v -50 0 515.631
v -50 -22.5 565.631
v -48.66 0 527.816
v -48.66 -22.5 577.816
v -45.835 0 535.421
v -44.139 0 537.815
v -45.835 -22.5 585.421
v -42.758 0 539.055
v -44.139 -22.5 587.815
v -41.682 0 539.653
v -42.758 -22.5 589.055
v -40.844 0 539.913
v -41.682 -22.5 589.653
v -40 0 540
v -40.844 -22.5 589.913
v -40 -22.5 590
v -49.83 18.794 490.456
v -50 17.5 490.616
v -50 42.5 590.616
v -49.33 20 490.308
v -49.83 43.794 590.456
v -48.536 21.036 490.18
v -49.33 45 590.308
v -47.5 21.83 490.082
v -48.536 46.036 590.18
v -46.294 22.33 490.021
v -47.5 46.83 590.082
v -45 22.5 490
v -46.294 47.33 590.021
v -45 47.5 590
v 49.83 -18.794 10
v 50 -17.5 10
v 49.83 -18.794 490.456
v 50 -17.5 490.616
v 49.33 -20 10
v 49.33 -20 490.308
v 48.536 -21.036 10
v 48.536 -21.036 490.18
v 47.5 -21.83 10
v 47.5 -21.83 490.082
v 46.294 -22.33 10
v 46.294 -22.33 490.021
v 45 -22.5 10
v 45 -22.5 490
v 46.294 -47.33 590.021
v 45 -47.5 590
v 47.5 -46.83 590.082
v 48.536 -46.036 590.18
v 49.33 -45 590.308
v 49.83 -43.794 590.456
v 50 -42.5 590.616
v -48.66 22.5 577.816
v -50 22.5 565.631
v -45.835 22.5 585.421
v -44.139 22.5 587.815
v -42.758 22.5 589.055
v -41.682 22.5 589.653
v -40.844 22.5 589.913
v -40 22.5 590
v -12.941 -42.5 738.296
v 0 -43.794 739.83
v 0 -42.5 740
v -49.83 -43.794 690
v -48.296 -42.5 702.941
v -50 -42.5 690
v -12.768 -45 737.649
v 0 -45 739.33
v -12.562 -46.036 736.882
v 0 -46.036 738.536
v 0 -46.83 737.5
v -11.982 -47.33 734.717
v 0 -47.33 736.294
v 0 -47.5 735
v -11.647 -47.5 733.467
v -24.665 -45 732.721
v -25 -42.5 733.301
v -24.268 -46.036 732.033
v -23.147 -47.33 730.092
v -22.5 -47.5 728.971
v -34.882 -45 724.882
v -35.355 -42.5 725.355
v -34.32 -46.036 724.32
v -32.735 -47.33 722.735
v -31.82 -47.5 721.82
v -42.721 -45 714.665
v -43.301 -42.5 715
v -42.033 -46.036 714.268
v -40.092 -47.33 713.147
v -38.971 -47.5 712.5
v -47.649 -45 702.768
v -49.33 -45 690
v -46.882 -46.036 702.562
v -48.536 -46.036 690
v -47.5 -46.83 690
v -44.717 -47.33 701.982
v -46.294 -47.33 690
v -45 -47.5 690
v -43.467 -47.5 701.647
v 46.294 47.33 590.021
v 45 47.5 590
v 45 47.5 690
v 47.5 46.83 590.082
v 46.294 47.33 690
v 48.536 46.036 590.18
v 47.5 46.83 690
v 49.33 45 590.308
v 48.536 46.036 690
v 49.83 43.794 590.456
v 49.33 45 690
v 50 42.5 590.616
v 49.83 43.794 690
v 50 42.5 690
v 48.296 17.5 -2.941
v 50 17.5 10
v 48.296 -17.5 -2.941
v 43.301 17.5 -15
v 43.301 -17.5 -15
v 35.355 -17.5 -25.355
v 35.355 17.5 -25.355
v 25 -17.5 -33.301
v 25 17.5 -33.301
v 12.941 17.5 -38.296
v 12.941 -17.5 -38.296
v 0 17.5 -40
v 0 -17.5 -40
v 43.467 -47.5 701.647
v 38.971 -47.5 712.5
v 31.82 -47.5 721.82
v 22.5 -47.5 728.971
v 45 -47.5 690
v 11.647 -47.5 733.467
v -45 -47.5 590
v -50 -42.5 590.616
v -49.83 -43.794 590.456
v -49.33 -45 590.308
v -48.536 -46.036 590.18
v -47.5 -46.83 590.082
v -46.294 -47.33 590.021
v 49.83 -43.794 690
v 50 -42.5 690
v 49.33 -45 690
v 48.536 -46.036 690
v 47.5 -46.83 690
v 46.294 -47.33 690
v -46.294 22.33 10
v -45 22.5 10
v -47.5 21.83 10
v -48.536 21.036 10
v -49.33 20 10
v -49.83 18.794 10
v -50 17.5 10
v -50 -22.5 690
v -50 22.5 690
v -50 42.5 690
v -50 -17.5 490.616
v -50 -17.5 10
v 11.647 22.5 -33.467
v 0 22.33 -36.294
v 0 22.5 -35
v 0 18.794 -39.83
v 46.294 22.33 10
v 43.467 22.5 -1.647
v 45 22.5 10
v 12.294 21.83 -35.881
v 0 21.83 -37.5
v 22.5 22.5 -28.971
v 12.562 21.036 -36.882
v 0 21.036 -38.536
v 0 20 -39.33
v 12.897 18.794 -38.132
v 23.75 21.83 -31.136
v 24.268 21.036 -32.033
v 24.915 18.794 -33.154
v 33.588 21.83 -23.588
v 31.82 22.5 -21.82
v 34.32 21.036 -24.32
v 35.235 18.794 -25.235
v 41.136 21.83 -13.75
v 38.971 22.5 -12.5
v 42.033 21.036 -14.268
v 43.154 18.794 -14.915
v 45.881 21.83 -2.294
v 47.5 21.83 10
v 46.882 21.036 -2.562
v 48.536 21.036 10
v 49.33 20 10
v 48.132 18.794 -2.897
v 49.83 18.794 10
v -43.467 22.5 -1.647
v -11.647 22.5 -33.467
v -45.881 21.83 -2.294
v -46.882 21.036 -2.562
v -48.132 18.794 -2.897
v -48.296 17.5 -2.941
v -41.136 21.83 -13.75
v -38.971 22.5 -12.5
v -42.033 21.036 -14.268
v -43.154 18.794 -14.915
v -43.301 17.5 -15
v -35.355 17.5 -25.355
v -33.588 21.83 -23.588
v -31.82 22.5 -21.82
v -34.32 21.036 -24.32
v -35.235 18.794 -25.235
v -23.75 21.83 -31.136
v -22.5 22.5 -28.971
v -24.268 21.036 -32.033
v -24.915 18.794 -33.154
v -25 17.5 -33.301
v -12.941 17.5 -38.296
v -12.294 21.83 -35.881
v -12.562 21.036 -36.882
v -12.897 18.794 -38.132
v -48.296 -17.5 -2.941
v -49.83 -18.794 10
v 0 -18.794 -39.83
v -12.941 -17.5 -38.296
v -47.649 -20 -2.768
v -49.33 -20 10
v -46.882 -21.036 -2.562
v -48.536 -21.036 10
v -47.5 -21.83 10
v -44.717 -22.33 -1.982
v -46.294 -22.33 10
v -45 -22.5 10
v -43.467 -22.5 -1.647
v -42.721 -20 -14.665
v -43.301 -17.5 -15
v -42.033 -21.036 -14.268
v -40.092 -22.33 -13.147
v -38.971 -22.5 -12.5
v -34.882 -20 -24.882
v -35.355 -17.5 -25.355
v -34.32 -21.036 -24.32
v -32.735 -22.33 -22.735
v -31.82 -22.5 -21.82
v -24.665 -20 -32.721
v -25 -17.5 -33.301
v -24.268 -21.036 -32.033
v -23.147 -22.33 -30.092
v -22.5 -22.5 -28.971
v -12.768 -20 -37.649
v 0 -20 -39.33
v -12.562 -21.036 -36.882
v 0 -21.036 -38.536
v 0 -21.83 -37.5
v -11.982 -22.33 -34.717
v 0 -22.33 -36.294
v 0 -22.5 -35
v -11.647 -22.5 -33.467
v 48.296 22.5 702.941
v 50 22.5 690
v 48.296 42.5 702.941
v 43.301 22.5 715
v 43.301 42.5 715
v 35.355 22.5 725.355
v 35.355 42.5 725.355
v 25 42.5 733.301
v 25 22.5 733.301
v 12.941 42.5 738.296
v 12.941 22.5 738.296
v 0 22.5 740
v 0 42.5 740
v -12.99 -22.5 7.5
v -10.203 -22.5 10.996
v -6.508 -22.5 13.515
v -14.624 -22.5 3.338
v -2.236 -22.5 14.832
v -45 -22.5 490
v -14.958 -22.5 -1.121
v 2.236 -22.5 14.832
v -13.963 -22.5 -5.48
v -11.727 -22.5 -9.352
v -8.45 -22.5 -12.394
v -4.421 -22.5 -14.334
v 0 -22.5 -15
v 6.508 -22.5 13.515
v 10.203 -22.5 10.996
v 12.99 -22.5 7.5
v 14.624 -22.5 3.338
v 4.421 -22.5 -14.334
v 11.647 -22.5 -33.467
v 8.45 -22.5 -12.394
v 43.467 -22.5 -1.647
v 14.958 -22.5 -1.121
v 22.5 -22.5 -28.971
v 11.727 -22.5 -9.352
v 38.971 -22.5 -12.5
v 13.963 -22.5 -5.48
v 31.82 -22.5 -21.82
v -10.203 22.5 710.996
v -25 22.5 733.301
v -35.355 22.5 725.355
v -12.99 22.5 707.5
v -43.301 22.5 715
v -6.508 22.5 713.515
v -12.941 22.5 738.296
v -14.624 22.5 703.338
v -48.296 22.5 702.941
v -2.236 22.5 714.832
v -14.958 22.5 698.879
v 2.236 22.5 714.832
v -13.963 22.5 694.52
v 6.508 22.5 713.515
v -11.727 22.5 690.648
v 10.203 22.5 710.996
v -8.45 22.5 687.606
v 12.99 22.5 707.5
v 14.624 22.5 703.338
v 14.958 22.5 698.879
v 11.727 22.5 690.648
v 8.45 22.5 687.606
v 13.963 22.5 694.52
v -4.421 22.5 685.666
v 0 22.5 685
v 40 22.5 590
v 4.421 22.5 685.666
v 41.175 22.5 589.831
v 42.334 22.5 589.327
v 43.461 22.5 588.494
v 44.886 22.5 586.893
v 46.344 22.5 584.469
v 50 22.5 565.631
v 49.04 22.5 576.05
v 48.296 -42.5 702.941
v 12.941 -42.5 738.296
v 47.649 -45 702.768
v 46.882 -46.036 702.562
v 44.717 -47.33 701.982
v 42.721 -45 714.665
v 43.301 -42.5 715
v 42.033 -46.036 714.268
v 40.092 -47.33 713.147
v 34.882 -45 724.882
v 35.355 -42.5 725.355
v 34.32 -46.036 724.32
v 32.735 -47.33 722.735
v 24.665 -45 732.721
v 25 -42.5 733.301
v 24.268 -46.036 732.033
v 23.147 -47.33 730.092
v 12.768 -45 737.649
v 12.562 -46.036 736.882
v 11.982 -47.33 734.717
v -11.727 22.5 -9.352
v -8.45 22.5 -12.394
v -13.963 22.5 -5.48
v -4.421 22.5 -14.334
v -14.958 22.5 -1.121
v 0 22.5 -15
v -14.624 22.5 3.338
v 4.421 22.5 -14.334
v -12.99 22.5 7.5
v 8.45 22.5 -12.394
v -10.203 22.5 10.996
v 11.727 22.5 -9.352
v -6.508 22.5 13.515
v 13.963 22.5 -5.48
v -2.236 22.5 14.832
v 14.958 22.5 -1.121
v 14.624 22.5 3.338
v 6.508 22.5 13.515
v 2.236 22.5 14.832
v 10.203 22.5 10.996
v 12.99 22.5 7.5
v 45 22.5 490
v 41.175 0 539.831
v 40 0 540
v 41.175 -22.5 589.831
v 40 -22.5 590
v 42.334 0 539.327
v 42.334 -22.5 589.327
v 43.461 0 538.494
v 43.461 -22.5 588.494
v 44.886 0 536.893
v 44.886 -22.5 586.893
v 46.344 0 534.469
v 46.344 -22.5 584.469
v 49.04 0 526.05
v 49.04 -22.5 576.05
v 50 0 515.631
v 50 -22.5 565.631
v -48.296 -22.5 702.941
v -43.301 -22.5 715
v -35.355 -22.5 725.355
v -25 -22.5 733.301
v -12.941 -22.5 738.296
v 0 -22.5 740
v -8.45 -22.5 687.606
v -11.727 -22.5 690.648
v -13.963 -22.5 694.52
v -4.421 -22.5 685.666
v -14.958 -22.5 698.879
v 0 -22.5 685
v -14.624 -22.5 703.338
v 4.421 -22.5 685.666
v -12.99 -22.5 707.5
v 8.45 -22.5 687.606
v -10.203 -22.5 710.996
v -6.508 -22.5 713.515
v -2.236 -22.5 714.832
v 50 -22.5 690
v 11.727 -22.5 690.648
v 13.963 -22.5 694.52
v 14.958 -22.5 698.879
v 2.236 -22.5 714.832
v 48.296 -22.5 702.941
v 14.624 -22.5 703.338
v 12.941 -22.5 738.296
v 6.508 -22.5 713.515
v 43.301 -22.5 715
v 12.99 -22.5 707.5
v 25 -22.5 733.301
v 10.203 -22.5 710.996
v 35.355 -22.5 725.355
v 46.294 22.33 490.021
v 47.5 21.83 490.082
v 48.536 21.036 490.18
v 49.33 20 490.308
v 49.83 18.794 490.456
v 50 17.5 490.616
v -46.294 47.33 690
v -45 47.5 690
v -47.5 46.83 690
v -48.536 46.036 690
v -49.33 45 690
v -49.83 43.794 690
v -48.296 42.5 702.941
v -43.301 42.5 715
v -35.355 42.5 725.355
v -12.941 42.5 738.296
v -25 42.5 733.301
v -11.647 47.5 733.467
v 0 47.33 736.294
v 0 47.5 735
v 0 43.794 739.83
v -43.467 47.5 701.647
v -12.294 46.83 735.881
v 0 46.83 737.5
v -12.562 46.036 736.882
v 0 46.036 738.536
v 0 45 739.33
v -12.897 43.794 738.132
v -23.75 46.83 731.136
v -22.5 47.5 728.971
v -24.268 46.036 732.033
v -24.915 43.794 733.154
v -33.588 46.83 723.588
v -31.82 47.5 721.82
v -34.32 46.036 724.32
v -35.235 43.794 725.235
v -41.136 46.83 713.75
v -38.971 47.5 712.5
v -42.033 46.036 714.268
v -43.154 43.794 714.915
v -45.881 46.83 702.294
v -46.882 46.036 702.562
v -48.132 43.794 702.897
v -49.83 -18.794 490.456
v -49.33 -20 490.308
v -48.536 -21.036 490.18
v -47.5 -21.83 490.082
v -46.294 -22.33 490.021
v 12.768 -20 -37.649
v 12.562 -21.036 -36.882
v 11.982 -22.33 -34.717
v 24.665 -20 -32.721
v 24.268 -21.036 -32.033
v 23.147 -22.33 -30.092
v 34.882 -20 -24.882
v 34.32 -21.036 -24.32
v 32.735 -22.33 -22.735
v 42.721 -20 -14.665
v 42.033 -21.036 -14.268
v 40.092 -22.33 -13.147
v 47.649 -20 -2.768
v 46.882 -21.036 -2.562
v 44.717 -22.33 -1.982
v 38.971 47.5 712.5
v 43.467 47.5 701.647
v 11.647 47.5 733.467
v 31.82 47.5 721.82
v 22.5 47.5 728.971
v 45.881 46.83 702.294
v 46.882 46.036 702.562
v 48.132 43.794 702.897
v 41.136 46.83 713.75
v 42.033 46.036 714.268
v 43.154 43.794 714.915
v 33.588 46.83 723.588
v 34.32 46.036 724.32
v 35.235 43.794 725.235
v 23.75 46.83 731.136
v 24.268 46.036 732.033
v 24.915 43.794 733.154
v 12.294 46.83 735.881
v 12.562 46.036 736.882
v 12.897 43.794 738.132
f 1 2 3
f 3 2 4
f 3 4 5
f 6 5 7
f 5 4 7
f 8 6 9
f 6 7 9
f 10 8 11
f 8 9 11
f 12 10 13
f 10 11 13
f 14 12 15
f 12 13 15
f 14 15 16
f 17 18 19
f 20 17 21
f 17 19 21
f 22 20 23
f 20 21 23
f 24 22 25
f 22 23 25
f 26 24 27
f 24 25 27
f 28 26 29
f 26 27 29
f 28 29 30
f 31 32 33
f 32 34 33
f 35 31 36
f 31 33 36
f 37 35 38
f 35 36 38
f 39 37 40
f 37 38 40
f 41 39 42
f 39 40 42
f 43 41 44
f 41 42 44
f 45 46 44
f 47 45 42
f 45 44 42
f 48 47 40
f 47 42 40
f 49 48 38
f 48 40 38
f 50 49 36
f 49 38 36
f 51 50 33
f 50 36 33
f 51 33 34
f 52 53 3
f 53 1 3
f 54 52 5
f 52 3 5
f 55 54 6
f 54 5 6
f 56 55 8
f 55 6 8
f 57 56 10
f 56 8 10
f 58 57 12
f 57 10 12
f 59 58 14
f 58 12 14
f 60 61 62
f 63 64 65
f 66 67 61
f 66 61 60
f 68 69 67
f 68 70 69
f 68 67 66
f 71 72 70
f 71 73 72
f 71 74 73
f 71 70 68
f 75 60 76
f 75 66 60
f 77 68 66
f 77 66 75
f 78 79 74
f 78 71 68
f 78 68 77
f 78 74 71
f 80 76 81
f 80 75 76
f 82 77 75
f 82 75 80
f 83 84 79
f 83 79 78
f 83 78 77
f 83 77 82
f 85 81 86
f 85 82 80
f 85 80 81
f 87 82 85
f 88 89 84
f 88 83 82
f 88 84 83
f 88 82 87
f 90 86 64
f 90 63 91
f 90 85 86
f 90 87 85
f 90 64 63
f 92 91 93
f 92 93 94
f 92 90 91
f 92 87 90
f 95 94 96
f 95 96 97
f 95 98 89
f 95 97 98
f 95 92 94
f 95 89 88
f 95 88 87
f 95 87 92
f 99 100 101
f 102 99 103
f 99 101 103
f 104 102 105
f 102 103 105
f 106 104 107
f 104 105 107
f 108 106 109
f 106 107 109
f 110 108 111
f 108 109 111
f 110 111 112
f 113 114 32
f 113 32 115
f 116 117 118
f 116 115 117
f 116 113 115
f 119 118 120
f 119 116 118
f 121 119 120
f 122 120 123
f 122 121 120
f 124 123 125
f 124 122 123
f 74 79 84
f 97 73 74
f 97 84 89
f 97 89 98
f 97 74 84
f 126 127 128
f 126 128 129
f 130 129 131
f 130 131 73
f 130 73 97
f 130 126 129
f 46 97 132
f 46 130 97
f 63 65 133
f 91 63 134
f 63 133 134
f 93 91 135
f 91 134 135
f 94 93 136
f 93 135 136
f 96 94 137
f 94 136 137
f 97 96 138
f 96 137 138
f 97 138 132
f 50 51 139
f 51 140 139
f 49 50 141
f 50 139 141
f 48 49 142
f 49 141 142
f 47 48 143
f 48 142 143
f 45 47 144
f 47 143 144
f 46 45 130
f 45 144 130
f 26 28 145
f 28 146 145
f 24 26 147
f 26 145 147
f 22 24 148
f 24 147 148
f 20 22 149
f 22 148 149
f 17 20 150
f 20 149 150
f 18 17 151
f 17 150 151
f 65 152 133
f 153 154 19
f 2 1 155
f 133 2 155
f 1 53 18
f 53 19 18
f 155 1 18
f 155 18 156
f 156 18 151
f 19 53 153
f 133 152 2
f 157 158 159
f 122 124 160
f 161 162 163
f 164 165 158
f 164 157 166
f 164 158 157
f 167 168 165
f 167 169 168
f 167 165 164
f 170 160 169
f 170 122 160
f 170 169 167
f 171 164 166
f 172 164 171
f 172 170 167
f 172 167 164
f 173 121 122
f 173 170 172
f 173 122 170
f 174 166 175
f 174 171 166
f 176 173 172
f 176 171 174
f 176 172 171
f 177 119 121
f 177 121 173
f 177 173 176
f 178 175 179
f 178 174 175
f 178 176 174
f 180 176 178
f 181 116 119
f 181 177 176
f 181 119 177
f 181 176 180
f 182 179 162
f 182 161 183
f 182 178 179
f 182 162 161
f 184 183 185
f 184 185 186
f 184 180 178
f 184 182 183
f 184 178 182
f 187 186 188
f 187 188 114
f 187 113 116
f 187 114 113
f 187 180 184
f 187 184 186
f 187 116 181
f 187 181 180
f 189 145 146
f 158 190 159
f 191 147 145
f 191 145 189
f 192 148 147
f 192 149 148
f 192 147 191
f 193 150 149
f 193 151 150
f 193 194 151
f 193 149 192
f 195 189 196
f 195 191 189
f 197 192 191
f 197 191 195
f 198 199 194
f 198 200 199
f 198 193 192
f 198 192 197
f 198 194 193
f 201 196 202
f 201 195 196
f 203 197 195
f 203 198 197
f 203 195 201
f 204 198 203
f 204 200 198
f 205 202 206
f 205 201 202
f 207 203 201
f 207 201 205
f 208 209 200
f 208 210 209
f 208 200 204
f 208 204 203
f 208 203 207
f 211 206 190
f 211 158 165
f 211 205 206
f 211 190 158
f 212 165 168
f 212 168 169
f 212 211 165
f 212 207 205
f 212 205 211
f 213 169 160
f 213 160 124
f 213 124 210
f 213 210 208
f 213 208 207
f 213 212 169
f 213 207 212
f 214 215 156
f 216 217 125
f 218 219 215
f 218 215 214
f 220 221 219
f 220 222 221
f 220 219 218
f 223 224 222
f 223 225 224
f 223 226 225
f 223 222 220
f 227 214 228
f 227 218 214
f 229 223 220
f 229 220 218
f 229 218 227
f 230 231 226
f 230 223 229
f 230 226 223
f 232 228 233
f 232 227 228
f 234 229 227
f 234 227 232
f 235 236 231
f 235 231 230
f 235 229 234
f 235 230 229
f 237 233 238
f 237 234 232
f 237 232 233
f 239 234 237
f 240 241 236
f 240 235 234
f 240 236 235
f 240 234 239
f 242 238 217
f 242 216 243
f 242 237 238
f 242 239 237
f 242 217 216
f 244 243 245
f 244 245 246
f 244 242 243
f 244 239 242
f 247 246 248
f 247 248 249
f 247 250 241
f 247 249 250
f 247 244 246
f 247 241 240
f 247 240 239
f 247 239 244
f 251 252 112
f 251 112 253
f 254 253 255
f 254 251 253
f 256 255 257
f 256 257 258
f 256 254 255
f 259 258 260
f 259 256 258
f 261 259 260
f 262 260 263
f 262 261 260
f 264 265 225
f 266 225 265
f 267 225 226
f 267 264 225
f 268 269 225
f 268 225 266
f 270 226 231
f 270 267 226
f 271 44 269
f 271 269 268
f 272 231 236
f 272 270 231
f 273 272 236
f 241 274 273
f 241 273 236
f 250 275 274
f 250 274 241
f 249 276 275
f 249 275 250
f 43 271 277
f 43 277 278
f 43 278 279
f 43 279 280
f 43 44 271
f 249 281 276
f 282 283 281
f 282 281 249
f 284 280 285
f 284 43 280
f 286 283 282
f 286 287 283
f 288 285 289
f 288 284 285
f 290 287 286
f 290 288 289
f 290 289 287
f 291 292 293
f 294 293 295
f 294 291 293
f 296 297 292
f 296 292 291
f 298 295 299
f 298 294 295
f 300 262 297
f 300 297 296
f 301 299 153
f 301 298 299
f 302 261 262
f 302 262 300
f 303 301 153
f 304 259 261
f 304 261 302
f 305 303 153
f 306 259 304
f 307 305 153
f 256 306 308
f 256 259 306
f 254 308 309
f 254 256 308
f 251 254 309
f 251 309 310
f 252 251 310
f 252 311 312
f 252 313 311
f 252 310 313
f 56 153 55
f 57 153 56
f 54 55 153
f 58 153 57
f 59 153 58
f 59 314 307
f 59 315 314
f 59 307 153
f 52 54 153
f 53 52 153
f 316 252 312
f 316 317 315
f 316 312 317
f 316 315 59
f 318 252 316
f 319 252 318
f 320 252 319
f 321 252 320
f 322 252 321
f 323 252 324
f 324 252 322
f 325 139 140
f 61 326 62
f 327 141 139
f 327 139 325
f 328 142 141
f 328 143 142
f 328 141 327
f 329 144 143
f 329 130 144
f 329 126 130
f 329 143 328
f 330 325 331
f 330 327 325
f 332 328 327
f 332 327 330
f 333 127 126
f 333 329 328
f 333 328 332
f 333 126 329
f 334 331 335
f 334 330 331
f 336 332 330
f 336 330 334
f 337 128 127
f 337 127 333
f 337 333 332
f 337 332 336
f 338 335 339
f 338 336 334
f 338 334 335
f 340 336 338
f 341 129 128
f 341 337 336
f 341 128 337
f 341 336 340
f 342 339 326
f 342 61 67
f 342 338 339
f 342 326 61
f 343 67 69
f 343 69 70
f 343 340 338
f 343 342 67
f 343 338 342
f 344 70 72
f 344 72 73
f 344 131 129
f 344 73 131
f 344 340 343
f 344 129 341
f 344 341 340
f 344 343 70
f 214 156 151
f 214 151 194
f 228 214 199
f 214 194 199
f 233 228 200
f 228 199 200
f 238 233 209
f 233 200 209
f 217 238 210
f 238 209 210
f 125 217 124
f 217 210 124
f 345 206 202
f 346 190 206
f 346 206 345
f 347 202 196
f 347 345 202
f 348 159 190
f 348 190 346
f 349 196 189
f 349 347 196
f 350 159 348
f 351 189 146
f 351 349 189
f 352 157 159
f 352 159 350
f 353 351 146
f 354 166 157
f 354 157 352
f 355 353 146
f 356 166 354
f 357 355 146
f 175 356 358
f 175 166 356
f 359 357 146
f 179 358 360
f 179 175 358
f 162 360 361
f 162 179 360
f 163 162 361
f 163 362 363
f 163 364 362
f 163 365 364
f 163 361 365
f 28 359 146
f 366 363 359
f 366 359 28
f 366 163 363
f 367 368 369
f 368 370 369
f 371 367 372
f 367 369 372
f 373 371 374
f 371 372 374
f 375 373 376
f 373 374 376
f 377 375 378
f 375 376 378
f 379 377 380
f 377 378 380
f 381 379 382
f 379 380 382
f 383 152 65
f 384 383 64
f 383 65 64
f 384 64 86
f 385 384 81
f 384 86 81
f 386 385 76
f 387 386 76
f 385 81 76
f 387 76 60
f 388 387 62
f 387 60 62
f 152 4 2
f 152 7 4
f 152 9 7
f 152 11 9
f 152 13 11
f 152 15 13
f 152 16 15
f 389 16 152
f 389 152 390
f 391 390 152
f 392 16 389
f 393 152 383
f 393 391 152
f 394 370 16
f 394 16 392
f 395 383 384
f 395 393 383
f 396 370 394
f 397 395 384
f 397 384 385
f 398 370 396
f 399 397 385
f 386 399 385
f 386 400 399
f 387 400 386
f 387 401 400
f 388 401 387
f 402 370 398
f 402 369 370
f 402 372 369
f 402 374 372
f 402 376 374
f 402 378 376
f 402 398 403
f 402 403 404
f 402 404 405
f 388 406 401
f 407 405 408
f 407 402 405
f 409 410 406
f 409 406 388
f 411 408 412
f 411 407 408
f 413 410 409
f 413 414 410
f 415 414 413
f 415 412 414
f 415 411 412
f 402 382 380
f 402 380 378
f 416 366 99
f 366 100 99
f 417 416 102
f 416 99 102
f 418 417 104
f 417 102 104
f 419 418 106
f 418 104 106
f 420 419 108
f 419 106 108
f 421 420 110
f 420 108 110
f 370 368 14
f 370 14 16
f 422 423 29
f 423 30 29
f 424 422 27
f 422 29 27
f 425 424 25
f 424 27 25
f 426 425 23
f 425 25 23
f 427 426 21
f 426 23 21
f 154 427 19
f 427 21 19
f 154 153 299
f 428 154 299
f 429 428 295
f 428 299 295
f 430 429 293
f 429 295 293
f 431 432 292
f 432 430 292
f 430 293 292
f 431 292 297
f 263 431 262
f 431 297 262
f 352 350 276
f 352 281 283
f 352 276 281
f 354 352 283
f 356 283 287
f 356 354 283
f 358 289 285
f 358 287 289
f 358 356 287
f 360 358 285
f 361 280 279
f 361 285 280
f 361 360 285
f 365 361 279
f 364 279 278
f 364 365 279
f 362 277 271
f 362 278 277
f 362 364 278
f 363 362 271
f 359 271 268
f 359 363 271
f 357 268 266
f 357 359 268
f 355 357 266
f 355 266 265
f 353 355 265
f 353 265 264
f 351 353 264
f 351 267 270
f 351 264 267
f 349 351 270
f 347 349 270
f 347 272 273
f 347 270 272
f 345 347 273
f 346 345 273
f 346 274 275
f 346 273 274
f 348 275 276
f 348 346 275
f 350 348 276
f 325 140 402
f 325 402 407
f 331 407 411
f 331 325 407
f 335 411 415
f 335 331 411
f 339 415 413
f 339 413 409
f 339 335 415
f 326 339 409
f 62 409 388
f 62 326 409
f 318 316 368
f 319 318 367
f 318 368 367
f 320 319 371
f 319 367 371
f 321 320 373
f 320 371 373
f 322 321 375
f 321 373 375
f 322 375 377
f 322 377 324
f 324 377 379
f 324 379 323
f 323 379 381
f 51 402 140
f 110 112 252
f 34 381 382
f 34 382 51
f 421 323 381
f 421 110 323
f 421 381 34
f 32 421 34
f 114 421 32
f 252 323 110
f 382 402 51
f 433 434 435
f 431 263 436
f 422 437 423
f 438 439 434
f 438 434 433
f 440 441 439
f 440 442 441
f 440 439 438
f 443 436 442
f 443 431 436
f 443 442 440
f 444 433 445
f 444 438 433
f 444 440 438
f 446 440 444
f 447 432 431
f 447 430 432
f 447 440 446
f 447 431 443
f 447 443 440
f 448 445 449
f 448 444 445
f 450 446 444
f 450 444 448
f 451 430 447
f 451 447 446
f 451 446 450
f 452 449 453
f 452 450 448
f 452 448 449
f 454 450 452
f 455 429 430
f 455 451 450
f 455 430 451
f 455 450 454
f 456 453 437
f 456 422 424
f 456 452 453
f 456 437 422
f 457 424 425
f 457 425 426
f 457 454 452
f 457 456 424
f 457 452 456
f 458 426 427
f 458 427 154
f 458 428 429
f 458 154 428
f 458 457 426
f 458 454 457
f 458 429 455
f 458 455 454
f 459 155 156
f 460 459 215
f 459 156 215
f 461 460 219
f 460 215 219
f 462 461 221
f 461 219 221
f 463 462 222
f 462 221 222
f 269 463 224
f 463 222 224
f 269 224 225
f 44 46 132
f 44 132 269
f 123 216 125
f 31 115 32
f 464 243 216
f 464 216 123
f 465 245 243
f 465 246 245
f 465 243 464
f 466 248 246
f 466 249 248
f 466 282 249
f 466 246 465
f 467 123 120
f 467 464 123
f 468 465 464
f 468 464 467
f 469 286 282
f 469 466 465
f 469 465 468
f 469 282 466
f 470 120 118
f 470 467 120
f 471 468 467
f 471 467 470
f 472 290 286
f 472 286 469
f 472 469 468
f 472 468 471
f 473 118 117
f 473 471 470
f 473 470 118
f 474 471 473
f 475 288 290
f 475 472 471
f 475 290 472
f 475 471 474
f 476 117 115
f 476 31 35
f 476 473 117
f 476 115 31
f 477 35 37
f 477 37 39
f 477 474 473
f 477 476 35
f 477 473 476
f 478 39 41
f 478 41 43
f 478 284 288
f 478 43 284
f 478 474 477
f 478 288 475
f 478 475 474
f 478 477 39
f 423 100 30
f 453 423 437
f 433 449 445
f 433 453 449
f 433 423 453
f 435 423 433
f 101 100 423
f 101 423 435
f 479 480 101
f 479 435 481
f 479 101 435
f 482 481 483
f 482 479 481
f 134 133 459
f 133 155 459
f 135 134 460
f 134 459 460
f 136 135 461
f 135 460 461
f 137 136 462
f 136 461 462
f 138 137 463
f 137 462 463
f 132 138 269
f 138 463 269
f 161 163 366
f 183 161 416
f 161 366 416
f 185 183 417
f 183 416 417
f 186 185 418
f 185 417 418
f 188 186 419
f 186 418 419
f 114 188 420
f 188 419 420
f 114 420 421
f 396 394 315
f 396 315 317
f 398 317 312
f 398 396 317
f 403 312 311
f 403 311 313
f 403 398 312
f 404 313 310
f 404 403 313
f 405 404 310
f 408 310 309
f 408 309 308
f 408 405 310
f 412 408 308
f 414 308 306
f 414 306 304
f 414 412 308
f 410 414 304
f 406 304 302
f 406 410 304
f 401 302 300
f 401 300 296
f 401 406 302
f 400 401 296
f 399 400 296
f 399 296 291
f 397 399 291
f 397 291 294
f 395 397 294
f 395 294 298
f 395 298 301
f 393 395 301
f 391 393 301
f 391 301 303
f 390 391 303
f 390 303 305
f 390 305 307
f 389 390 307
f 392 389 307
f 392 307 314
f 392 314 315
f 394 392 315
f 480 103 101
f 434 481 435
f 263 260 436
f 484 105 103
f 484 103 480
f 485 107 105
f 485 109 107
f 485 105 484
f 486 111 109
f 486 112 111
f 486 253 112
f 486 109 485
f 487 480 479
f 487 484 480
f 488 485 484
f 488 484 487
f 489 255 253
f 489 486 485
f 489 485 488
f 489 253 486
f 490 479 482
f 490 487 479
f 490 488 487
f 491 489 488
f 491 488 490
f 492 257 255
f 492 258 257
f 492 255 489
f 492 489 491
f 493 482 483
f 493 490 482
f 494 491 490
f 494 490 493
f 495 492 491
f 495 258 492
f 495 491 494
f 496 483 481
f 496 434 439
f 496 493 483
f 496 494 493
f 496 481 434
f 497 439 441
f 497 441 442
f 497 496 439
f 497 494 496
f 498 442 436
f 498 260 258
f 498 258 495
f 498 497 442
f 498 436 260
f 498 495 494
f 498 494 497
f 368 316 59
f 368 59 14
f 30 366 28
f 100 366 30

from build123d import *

# Parameters (mm, degrees)
BOSS_EXTRUDE1_DEPTH     = 50
CUT_EXTRUDE1_DEPTH      = 745.983221288
CUT_EXTRUDE1_DEPTH_BACK = 745.983221288
SKETCH3_R               = 15
SKETCH4_R               = 15
BOSS_EXTRUDE2_DEPTH     = 95
FILLET1_R               = 50
FILLET2_R               = 10
FILLET3_R               = 50
FILLET4_R               = 5


with BuildPart() as part:
    # Sketch2 → Boss-Extrude1 (new, symmetric)
    with BuildSketch(Plane(origin=(0, 0, 0), x_dir=(0, 0, -1), z_dir=(1, 0, 0))):
        Polygon((0, -22.5), (40, -22.5), (40, 22.5), (0, 22.5), (-490, 22.5), (-590, 47.5), (-740, 47.5), (-740, 22.5), (-590, 22.5), (-540, 0), (-590, -22.5), (-740, -22.5), (-740, -47.5), (-590, -47.5), (-490, -22.5), align=None)
    extrude(amount=BOSS_EXTRUDE1_DEPTH, both=True)

    # Sketch3 → Cut-Extrude1 (cut, two sides: drawn at the far end of the back side and taken through both)
    with BuildSketch(Plane.XZ.offset(22.5).offset(-CUT_EXTRUDE1_DEPTH_BACK)):
        with Locations(Location((0, 0, 0), (0, 0, 270))):
            Circle(SKETCH3_R)
    extrude(amount=CUT_EXTRUDE1_DEPTH + CUT_EXTRUDE1_DEPTH_BACK, mode=Mode.SUBTRACT)

    # Sketch4 → Boss-Extrude2 (add)
    with BuildSketch(Plane.XZ.offset(47.5)):
        with Locations(Location((0, 700, 0), (0, 0, 270))):
            Circle(SKETCH4_R)
    extrude(amount=-BOSS_EXTRUDE2_DEPTH)

    # Fillet1
    fillet1_edges = [part.edges().sort_by_distance(p)[0] for p in [
        (50, 0, -40),
        (-50, 0, -40),
    ]]
    fillet(fillet1_edges, radius=FILLET1_R - 0.0001)  # a hair under: the kernel refuses the full size

    # Fillet2
    fillet2_edges = [part.edges().sort_by_distance(p)[0] for p in [
        (-50, -11.25, 565),
        (-50, 11.25, 565),
        (50, 11.25, 565),
        (50, -11.25, 565),
    ]]
    fillet(fillet2_edges, radius=FILLET2_R)

    # Fillet3
    fillet3_edges = [part.edges().sort_by_distance(p)[0] for p in [
        (-50, -35, 740),
        (-50, 35, 740),
        (50, 35, 740),
        (50, -35, 740),
    ]]
    fillet(fillet3_edges, radius=FILLET3_R - 0.0001)  # a hair under: the kernel refuses the full size

    # Fillet4
    fillet4_edges = [part.edges().sort_by_distance(p)[0] for p in [
        (-50, -47.5, 640.00005),
        (50, -47.5, 640.00005),
        (35.355368349, -47.5, 725.355368349),
        (-35.355368349, -47.5, 725.355368349),
        (35.355368349, 47.5, 725.355368349),
        (-35.355368349, 47.5, 725.355368349),
        (-50, -35, 540),
        (-50, 47.5, 640.00005),
        (-50, 35, 540),
        (-50, -22.5, 249.99995),
        (50, 35, 540),
        (50, 47.5, 640.00005),
        (50, -22.5, 249.99995),
        (50, 22.5, 249.99995),
        (50, -35, 540),
        (-50, 22.5, 249.99995),
        (-35.355368349, 22.5, -25.355368349),
        (35.355368349, 22.5, -25.355368349),
        (-35.355368349, -22.5, -25.355368349),
        (35.355368349, -22.5, -25.355368349),
    ]]
    fillet(fillet4_edges, radius=FILLET4_R)


solid = part.part
